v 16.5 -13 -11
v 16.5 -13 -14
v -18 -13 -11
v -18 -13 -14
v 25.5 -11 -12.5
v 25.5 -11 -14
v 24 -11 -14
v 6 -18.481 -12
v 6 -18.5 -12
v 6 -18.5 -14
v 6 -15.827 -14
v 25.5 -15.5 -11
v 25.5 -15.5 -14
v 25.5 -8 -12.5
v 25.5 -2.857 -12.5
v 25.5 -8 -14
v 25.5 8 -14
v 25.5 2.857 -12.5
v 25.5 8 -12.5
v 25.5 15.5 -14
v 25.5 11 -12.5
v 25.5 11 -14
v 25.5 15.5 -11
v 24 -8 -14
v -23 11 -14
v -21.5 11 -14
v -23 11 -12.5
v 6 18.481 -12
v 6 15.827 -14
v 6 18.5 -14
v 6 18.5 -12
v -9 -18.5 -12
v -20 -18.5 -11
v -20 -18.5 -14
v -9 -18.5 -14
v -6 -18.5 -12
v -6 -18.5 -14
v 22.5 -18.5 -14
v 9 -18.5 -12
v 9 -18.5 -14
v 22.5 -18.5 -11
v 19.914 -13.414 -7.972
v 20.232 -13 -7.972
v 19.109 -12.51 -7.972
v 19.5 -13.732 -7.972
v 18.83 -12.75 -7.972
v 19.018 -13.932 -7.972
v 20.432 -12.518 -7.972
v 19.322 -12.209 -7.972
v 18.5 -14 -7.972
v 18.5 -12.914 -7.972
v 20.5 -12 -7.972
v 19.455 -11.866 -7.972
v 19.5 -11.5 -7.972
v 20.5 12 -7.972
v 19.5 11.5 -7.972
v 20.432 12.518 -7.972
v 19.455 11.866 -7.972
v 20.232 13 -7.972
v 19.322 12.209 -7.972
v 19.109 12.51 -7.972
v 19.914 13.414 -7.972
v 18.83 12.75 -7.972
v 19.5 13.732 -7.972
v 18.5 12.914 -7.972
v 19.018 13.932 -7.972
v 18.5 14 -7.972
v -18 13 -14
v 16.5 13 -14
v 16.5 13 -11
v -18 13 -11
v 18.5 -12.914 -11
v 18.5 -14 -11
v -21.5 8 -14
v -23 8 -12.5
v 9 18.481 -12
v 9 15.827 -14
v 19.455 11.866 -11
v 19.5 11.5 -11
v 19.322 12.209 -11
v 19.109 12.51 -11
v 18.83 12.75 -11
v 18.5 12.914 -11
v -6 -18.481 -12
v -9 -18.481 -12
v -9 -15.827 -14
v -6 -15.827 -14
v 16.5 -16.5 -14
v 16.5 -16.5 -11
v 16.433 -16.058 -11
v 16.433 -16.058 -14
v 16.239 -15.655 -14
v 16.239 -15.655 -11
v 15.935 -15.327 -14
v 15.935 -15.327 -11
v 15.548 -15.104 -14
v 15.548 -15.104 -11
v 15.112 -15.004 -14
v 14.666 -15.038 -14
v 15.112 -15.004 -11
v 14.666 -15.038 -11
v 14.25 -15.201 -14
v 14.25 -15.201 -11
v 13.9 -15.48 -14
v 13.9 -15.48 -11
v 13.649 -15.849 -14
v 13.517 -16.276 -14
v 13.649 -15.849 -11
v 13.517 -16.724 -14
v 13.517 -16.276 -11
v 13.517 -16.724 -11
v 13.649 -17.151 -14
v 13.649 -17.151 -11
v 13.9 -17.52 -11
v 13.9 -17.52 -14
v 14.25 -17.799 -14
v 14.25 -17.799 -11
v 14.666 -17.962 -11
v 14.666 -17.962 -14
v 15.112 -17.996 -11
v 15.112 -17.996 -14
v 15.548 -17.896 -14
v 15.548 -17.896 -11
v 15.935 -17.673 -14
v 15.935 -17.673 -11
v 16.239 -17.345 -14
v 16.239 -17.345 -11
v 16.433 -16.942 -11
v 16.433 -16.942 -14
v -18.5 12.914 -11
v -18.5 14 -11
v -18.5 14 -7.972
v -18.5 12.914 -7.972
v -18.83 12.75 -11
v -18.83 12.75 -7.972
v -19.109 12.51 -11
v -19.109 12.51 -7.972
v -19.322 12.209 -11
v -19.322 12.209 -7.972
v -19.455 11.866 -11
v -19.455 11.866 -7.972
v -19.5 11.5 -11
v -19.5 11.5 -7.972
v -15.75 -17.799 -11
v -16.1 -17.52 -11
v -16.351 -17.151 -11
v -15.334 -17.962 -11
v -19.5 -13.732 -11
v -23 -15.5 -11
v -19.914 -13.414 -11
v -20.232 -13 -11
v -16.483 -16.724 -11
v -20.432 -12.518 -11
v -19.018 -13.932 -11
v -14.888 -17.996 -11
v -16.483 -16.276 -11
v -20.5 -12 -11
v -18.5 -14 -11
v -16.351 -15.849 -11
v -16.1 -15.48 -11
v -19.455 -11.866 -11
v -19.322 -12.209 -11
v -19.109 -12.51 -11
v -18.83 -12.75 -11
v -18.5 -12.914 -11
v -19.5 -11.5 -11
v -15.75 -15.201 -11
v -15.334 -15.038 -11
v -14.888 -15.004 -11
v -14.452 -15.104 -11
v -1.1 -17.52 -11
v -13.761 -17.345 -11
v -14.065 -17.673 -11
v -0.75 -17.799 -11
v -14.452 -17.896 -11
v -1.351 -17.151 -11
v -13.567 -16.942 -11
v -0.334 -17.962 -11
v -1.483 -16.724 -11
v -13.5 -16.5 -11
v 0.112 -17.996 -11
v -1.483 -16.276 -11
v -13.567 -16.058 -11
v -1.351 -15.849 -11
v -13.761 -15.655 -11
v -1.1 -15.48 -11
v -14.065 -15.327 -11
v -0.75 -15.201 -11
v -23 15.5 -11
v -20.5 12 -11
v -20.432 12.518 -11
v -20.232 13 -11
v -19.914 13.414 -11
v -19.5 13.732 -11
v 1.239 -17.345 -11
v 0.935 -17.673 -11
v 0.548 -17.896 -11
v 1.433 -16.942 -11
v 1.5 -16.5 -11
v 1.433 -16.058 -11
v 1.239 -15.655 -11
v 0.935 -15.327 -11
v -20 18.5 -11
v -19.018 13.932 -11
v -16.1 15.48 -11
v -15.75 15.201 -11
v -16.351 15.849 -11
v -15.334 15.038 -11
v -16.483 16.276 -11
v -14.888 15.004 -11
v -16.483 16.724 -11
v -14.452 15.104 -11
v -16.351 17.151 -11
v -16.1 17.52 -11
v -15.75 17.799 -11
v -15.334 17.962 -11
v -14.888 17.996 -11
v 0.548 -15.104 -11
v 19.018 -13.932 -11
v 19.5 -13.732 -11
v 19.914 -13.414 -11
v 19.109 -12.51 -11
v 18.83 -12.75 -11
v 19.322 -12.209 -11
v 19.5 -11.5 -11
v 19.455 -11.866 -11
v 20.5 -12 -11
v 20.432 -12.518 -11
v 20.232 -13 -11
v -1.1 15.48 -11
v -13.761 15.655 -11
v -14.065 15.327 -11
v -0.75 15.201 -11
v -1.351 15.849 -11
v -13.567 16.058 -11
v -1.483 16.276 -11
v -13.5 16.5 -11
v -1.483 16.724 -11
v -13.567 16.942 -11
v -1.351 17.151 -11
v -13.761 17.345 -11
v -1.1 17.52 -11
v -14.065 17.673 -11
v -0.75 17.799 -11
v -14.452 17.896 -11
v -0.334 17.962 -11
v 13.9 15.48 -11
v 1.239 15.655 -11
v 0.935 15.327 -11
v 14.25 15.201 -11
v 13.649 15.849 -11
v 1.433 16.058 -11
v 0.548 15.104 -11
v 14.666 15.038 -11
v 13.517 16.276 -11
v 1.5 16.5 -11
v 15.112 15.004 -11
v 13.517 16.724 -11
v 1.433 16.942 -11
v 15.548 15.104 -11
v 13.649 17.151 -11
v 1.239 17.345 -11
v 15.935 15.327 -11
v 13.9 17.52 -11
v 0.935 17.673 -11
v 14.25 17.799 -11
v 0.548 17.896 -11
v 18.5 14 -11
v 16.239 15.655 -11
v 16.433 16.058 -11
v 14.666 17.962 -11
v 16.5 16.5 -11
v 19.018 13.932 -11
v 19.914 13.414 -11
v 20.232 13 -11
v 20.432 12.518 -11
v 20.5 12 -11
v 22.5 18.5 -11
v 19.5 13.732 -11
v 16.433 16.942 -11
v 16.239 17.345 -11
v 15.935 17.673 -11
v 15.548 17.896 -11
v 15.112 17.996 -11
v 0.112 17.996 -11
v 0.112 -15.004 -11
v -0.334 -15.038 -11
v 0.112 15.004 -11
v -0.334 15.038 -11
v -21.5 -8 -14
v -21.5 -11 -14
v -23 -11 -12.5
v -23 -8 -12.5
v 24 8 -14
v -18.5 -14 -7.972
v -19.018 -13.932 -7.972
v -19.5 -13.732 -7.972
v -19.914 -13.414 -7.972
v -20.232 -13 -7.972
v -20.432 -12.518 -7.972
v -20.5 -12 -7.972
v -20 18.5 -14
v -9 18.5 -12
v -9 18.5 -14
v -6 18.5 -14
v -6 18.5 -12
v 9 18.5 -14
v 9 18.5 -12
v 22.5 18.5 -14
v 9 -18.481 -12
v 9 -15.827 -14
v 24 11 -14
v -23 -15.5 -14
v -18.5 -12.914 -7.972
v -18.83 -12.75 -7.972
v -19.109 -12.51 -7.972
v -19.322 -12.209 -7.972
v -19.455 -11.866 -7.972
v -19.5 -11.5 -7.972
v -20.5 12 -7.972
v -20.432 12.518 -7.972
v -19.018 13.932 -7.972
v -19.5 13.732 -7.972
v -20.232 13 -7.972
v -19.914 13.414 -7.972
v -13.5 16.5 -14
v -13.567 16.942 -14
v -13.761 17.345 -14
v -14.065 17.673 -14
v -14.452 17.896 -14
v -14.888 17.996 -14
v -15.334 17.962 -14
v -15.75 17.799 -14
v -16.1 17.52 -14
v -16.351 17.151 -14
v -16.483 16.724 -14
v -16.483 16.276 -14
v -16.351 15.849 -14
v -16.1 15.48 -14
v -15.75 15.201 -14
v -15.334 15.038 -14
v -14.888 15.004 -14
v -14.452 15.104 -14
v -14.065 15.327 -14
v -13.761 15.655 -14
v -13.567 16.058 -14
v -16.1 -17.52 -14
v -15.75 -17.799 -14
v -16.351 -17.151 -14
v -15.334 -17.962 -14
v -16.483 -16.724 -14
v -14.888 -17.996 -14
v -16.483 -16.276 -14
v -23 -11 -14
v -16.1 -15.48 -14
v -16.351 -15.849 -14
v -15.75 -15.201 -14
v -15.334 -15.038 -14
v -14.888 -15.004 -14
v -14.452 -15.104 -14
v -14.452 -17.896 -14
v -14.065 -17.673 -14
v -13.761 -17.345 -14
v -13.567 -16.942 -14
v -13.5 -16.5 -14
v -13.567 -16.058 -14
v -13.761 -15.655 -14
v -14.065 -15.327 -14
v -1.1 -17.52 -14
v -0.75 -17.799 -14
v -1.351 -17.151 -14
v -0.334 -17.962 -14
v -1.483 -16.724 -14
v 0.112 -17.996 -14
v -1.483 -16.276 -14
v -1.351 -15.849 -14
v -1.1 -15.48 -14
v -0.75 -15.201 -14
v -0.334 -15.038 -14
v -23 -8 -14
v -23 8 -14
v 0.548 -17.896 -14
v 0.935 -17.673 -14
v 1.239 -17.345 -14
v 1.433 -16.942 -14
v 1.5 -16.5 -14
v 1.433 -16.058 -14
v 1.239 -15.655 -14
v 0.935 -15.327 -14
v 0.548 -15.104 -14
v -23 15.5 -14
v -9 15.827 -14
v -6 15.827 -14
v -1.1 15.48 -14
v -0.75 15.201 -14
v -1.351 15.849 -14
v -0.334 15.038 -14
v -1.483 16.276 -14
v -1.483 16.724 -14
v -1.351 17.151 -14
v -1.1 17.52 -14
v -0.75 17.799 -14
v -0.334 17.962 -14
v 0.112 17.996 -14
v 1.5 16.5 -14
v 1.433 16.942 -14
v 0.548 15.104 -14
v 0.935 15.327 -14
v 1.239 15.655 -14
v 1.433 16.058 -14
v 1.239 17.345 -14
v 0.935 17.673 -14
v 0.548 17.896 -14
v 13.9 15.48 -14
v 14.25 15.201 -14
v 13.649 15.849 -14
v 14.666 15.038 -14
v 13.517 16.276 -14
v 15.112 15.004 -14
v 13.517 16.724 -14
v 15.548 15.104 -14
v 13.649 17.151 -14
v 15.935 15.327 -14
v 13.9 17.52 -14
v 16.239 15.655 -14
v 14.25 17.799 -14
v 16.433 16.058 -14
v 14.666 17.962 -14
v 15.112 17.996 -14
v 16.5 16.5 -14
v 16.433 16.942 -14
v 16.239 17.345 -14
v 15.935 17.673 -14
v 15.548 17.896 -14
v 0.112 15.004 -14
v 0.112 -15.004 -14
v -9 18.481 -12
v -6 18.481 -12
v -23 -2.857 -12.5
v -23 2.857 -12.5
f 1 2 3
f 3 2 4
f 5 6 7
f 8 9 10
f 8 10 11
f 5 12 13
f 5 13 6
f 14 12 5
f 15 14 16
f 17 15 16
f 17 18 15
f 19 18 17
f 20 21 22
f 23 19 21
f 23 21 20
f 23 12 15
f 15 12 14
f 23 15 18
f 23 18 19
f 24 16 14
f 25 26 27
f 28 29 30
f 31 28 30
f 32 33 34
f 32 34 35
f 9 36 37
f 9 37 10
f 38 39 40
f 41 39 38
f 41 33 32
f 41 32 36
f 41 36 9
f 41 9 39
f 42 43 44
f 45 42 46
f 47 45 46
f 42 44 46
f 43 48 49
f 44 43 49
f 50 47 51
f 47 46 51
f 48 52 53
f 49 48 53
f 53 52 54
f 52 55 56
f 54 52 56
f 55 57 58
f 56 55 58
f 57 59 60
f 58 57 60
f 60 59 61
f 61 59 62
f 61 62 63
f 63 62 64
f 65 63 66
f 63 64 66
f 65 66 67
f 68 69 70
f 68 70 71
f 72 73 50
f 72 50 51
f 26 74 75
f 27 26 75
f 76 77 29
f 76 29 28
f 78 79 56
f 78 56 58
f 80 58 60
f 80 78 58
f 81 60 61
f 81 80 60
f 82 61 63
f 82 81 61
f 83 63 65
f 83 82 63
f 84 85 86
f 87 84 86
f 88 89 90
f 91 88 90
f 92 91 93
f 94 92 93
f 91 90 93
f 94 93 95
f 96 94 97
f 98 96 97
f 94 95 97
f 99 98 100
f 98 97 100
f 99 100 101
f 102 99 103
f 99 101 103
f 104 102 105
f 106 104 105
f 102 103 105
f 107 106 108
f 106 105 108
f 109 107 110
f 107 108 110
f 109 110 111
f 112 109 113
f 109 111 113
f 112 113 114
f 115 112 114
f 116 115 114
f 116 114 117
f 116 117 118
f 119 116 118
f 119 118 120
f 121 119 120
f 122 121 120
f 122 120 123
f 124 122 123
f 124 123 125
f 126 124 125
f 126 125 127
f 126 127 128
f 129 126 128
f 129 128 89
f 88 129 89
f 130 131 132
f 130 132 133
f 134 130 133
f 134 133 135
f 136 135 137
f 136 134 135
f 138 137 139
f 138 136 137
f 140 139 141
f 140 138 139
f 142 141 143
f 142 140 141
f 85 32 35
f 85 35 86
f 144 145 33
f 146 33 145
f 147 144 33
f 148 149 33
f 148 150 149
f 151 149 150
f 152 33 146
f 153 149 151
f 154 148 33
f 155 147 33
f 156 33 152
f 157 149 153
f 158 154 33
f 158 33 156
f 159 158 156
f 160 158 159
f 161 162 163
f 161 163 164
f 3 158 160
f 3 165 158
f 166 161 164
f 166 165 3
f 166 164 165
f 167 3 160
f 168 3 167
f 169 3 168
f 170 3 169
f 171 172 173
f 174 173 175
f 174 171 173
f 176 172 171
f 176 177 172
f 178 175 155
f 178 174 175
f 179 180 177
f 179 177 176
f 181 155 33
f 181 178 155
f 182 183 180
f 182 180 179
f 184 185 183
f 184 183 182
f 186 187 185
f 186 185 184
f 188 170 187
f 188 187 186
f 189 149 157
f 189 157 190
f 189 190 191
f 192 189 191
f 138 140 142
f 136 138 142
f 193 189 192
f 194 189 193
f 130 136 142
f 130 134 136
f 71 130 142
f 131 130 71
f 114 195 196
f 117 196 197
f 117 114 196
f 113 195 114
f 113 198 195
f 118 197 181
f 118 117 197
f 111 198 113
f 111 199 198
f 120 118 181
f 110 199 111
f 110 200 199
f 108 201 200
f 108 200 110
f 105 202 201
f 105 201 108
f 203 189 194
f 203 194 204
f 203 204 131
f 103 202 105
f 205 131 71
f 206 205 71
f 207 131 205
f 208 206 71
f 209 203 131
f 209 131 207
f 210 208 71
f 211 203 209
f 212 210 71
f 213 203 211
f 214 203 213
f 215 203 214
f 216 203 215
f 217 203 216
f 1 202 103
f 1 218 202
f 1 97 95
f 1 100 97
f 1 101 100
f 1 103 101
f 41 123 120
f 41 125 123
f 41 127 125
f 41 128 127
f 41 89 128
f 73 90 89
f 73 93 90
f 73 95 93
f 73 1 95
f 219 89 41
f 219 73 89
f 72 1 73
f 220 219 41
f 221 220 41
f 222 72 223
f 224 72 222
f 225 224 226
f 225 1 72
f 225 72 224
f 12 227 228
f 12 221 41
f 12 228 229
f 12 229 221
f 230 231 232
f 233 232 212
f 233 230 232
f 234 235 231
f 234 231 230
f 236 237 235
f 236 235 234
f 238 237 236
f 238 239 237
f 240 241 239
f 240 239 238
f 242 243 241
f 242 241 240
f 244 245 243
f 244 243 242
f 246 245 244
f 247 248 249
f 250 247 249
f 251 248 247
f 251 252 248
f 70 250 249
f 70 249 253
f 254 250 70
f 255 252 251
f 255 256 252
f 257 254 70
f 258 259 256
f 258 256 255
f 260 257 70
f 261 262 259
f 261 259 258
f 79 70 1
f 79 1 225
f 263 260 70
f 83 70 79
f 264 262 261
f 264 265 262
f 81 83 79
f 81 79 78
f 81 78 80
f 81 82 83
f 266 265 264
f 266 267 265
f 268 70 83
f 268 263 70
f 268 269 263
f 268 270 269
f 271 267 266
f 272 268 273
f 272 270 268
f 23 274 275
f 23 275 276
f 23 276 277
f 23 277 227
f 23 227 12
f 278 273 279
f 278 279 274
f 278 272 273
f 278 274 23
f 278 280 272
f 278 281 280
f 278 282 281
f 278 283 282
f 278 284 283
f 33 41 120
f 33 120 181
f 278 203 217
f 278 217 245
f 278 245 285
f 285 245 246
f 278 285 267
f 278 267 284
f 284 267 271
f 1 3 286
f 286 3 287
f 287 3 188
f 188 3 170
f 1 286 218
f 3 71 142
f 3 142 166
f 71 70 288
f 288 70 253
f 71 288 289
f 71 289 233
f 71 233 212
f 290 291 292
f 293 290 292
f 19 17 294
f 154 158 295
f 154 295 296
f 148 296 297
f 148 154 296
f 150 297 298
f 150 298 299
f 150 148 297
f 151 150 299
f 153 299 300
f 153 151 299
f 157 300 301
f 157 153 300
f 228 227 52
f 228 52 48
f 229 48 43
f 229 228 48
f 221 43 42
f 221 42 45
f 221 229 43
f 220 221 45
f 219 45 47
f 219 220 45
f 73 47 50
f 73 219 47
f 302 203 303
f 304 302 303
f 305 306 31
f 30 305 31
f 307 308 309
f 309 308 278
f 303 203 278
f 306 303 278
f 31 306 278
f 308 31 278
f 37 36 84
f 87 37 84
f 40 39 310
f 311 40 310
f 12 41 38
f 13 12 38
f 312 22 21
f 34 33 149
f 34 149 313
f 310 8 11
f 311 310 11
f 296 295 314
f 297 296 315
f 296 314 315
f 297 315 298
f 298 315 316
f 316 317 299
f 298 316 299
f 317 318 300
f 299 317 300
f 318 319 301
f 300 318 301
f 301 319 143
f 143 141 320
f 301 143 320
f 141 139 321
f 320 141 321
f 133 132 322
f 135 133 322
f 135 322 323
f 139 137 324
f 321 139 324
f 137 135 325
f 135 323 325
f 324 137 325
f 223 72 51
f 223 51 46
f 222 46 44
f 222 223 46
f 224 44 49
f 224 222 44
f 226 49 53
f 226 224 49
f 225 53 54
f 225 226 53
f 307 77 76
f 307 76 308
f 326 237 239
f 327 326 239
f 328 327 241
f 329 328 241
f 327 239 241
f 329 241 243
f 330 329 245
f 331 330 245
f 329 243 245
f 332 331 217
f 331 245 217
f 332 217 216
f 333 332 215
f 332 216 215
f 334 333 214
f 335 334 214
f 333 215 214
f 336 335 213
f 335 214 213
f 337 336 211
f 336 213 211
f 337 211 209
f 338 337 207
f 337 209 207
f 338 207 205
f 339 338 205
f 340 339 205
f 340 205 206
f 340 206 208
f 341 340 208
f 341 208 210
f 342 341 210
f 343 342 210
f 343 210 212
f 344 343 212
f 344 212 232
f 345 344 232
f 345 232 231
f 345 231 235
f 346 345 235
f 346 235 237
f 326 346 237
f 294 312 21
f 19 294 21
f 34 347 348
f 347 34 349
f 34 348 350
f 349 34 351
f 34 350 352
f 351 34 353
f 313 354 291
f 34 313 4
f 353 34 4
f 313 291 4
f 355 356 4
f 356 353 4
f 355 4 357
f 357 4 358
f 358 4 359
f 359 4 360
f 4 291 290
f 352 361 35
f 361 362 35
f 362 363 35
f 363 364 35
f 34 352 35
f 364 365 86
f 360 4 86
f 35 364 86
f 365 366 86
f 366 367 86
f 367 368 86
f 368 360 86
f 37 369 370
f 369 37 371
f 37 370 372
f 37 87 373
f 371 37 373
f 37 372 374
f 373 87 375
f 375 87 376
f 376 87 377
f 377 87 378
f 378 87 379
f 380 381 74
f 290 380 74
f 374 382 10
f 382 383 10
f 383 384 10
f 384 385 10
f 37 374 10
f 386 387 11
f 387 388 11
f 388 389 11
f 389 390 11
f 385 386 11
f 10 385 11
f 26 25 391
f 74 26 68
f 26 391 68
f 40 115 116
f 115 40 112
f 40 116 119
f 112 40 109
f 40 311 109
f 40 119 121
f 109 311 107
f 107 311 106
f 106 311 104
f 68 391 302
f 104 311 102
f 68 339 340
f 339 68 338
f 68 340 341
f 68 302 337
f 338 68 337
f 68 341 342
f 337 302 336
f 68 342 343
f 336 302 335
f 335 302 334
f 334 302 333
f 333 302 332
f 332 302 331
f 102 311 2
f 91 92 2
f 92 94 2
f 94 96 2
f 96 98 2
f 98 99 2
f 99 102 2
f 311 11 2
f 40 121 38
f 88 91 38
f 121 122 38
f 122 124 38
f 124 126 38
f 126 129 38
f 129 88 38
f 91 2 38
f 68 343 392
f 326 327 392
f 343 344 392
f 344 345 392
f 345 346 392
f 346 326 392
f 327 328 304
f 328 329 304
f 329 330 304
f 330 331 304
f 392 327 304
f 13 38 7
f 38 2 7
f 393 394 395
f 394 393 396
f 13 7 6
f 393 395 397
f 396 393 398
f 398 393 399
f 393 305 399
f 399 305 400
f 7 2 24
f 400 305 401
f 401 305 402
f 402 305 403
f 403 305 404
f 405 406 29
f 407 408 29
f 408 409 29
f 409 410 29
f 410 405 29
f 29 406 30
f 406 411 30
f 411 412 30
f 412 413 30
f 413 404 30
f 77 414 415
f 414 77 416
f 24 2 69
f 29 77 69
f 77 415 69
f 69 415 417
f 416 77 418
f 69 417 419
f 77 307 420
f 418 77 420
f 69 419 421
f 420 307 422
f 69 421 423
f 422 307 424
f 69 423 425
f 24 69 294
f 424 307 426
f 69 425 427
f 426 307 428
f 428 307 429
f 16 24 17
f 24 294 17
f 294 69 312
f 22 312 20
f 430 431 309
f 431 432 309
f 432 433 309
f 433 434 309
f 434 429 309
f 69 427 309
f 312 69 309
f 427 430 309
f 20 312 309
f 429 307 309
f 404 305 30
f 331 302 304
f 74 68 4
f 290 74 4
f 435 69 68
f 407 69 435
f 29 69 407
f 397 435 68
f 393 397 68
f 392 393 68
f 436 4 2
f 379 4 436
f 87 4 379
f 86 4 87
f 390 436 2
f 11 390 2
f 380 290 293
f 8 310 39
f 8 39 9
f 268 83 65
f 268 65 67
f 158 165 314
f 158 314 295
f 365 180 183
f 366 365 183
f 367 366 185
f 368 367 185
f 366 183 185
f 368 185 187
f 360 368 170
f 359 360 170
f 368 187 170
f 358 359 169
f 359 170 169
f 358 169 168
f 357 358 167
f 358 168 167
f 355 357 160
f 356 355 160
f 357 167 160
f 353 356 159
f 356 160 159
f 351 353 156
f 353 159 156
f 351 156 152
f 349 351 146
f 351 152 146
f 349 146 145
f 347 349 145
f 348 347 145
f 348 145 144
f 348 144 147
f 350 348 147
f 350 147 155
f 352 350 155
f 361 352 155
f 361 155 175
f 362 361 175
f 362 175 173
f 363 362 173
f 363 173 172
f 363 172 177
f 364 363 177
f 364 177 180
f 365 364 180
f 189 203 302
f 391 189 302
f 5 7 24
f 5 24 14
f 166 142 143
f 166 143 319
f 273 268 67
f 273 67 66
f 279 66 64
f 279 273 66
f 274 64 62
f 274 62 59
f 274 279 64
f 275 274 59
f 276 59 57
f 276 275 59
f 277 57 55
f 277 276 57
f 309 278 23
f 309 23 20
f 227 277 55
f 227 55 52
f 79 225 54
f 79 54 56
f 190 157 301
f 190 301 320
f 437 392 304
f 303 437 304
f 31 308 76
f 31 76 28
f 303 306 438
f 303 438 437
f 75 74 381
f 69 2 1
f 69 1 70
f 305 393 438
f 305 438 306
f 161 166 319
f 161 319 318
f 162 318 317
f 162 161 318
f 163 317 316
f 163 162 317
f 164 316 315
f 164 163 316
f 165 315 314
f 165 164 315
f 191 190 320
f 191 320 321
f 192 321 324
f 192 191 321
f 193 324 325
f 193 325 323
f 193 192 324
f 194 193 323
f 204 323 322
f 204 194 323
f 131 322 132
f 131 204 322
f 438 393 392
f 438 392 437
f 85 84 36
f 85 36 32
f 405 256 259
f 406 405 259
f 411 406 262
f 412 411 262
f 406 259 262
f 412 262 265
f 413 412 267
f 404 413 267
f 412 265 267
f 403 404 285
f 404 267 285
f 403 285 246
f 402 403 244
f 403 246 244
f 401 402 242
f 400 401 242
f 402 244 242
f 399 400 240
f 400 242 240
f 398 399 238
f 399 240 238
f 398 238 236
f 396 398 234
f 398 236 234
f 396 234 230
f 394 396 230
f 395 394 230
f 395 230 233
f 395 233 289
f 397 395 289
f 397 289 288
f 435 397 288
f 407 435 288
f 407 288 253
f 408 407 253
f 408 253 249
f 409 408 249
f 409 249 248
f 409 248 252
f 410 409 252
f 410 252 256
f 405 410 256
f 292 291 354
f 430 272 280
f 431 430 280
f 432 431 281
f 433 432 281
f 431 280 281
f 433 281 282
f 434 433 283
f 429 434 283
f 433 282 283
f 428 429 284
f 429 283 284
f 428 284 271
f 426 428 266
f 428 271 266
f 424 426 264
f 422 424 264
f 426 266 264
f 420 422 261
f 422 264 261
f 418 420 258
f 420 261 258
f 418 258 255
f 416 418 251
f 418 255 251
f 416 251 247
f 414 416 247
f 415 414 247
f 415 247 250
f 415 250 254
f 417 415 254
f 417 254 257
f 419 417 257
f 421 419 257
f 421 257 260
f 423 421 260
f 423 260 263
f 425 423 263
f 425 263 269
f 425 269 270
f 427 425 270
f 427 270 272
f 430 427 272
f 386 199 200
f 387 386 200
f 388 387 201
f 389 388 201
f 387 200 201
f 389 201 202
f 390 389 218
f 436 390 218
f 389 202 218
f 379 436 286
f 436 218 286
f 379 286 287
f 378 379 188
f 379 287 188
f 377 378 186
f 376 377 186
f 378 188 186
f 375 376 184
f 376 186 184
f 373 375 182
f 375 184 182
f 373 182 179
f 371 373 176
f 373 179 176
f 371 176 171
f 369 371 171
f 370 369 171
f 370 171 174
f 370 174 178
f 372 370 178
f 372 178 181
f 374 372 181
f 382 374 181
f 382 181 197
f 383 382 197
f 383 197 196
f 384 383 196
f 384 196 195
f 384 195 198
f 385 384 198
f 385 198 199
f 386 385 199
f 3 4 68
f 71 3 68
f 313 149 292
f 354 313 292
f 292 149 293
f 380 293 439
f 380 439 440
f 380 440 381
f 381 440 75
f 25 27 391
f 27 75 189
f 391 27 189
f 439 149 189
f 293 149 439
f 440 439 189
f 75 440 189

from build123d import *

# Parameters (mm, degrees)
SKETCH_1_W                = 48.5
SKETCH_1_H                = 37
EXTRUDE_1_DEPTH           = 3
SKETCH_2_W                = 21.920667416
SKETCH_2_H                = 2.787
CUT_EXTRUDE_1_DEPTH       = 32.646484797
SKETCH_6_W                = 21.920667416
SKETCH_6_H                = 2.787
CUT_EXTRUDE_5_DEPTH       = 32.646484797
EXTRUDE_2_DEPTH           = 3.028
EXTRUDE_3_DEPTH           = 3.028
HOLE_WIZARD_M4_1_D        = 4.447
HOLE_WIZARD_3_0_3_1_D     = 3
HOLE_WIZARD_3_0_3_1_DEPTH = 6.028
SKETCH_13_W               = 34.5
SKETCH_13_H               = 26.000497192
CUT_EXTRUDE_7_DEPTH       = 10
CHAMFER_1_SIZE            = 3
SKETCH_14_W               = 3
SKETCH_14_H               = 4
CUT_EXTRUDE_8_DEPTH       = 2
CHAMFER_2_SIZE            = 3
CHAMFER_2_SIZE_2          = 3.981134465
SKETCH_15_W               = 2
SKETCH_15_H               = 3
CUT_EXTRUDE_9_DEPTH       = 1.5
CHAMFER_3_SIZE            = 2


with BuildPart() as part:
    # 草图1 → 凸台-拉伸1 (new body)
    with BuildSketch(Plane.XY.offset(-11)):
        with Locations((1.25, 0)):
            Rectangle(SKETCH_1_W, SKETCH_1_H)
    extrude(amount=-EXTRUDE_1_DEPTH)

    # 草图2 → 切除-拉伸1 (cut, through all)
    with BuildSketch(Plane(origin=(0, 0, -14), x_dir=(-1, 0, 0), z_dir=(0, 0, -1))):
        with Locations((6.539666292, -11.606748596)):
            Rectangle(SKETCH_2_W, SKETCH_2_H)
    extrude(amount=-CUT_EXTRUDE_1_DEPTH, mode=Mode.SUBTRACT)

    # 草图6 → 切除-拉伸5 (cut, through all)
    with BuildSketch(Plane(origin=(0, 0, -14), x_dir=(-1, 0, 0), z_dir=(0, 0, -1))):
        with Locations((6.539666292, 11.606748596)):
            Rectangle(SKETCH_6_W, SKETCH_6_H)
    extrude(amount=-CUT_EXTRUDE_5_DEPTH, mode=Mode.SUBTRACT)

    # 草图7 → 凸台-拉伸2 (add)
    with BuildSketch(Plane.XY.offset(-11)):
        with BuildLine():
            Line((-20.5, -12), (-20.5, 12))
            ThreePointArc((-20.5, 12), (-19.914213562, 13.414213562), (-18.5, 14))
            Line((-18.5, 14), (-18.5, 12.914213562))
            ThreePointArc((-18.5, 12.914213562), (-19.224744871, 12.366025404), (-19.5, 11.5))
            Line((-19.5, 11.5), (-19.5, -11.5))
            ThreePointArc((-19.5, -11.5), (-19.224744871, -12.366025404), (-18.5, -12.914213562))
            Line((-18.5, -12.914213562), (-18.5, -14))
            ThreePointArc((-18.5, -14), (-19.914213562, -13.414213562), (-20.5, -12))
        make_face()
    extrude(amount=EXTRUDE_2_DEPTH)

    # 草图8 → 凸台-拉伸3 (add)
    with BuildSketch(Plane.XY.offset(-11)):
        with BuildLine():
            Line((19.5, -11.5), (19.5, 11.5))
            ThreePointArc((19.5, 11.5), (19.224744871, 12.366025404), (18.5, 12.914213562))
            Line((18.5, 12.914213562), (18.5, 14))
            ThreePointArc((18.5, 14), (19.914213562, 13.414213562), (20.5, 12))
            Line((20.5, 12), (20.5, -12))
            ThreePointArc((20.5, -12), (19.914213562, -13.414213562), (18.5, -14))
            Line((18.5, -14), (18.5, -12.914213562))
            ThreePointArc((18.5, -12.914213562), (19.224744871, -12.366025404), (19.5, -11.5))
        make_face()
    extrude(amount=EXTRUDE_3_DEPTH)

    # M4 间隙孔1 (through all)
    with Locations(Plane.XY.offset(-11)):
        with Locations((12.25, 6.000000304)):
            Hole(HOLE_WIZARD_M4_1_D / 2)

    # Ø3.0 (3) 直径孔1
    with Locations(Plane(origin=(0, 0, -14), x_dir=(-1, 0, 0), z_dir=(0, 0, -1))):
        with Locations((-15, -16.5), (15, -16.5), (0, -16.5), (-15, 16.5), (15, 16.5), (0, 16.5)):
            Hole(HOLE_WIZARD_3_0_3_1_D / 2, depth=HOLE_WIZARD_3_0_3_1_DEPTH)

    # 草图13 → 切除-拉伸7 (cut, symmetric)
    with BuildSketch(Plane(origin=(0, 0, -14), x_dir=(-1, 0, 0), z_dir=(0, 0, -1))):
        with Locations((0.75, 0)):
            Rectangle(SKETCH_13_W, SKETCH_13_H)
    extrude(amount=CUT_EXTRUDE_7_DEPTH, both=True, mode=Mode.SUBTRACT)

    # 倒角1
    chamfer_1_edges = [part.edges().sort_by_distance(p)[0] for p in [
        (-23, 18.5, -12.5),
        (25.5, 18.5, -12.5),
        (25.5, -18.5, -12.5),
        (-23, -18.5, -12.5),
    ]]
    chamfer(chamfer_1_edges, length=CHAMFER_1_SIZE)

    # 草图14 → 切除-拉伸8 (cut)
    with BuildSketch(Plane(origin=(0, 0, -14), x_dir=(-1, 0, 0), z_dir=(0, 0, -1))):
        with Locations((-7.5, -16.5)):
            Rectangle(SKETCH_14_W, SKETCH_14_H)
        with Locations((7.5, -16.5)):
            Rectangle(SKETCH_14_W, SKETCH_14_H)
        with Locations((7.5, 16.5)):
            Rectangle(SKETCH_14_W, SKETCH_14_H)
        with Locations((-7.5, 16.5)):
            Rectangle(SKETCH_14_W, SKETCH_14_H)
    extrude(amount=-CUT_EXTRUDE_8_DEPTH, mode=Mode.SUBTRACT)

    # 倒角2
    # the kernel refuses this chamfer: 3.981134465, 3 mm, written as the material it adds along each edge
    with BuildSketch(Plane(origin=(-6, 14.5, -12), x_dir=(0, -0.04104604510109815, -0.9991572559820394), z_dir=(-1, 0, 0))) as chamfer_2_piece_1_section:
        Polygon((CHAMFER_2_SIZE * 0.999157255982, -CHAMFER_2_SIZE * 0.0410460451011), (-CHAMFER_2_SIZE_2 * 0.0410460450997, -CHAMFER_2_SIZE_2 * 0.999157255947), (0, 0), align=None)
    chamfer_2_piece_1 = extrude(amount=3, mode=Mode.PRIVATE)
    chamfer_2_piece_1 = split(chamfer_2_piece_1, bisect_by=Plane(origin=(-7.5, 15.961237376, -14), z_dir=(0, 0, 1)), keep=Keep.TOP, mode=Mode.PRIVATE)
    add(chamfer_2_piece_1)
    with BuildSketch(Plane(origin=(9, 14.5, -12), x_dir=(0, -0.04104604510109815, -0.9991572559820394), z_dir=(-1, 0, 0))) as chamfer_2_piece_2_section:
        Polygon((CHAMFER_2_SIZE * 0.999157255982, -CHAMFER_2_SIZE * 0.0410460451011), (-CHAMFER_2_SIZE_2 * 0.0410460450997, -CHAMFER_2_SIZE_2 * 0.999157255947), (0, 0), align=None)
    chamfer_2_piece_2 = extrude(amount=3, mode=Mode.PRIVATE)
    chamfer_2_piece_2 = split(chamfer_2_piece_2, bisect_by=Plane(origin=(7.5, 15.961237376, -14), z_dir=(0, 0, 1)), keep=Keep.TOP, mode=Mode.PRIVATE)
    add(chamfer_2_piece_2)
    with BuildSketch(Plane(origin=(-9, -14.5, -12), x_dir=(0, -0.9997280272590685, 0.023321052992758363), z_dir=(1, 0, 0))) as chamfer_2_piece_3_section:
        Polygon((CHAMFER_2_SIZE_2 * 0.999728027224, CHAMFER_2_SIZE_2 * 0.0233210529919), (-CHAMFER_2_SIZE * 0.0233210529928, CHAMFER_2_SIZE * 0.999728027259), (0, 0), align=None)
    chamfer_2_piece_3 = extrude(amount=3, mode=Mode.PRIVATE)
    chamfer_2_piece_3 = split(chamfer_2_piece_3, bisect_by=Plane(origin=(-7.5, -15.961237376, -14), z_dir=(0, 0, 1)), keep=Keep.TOP, mode=Mode.PRIVATE)
    add(chamfer_2_piece_3)
    with BuildSketch(Plane(origin=(6, -14.5, -12), x_dir=(0, -0.9997280272590685, 0.023321052992758374), z_dir=(1, 0, 0))) as chamfer_2_piece_4_section:
        Polygon((CHAMFER_2_SIZE_2 * 0.999728027224, CHAMFER_2_SIZE_2 * 0.0233210529919), (-CHAMFER_2_SIZE * 0.0233210529928, CHAMFER_2_SIZE * 0.999728027259), (0, 0), align=None)
    chamfer_2_piece_4 = extrude(amount=3, mode=Mode.PRIVATE)
    chamfer_2_piece_4 = split(chamfer_2_piece_4, bisect_by=Plane(origin=(7.5, -15.961237376, -14), z_dir=(0, 0, 1)), keep=Keep.TOP, mode=Mode.PRIVATE)
    add(chamfer_2_piece_4)

    # 草图15 → 切除-拉伸9 (cut)
    with BuildSketch(Plane(origin=(0, 0, -14), x_dir=(-1, 0, 0), z_dir=(0, 0, -1))):
        with Locations((-24.5, -9.5)):
            Rectangle(SKETCH_15_W, SKETCH_15_H)
        with Locations((-24.5, 9.5)):
            Rectangle(SKETCH_15_W, SKETCH_15_H)
        with Locations((22, 9.5)):
            Rectangle(SKETCH_15_W, SKETCH_15_H)
        with Locations((22, -9.5)):
            Rectangle(SKETCH_15_W, SKETCH_15_H)
    extrude(amount=-CUT_EXTRUDE_9_DEPTH, mode=Mode.SUBTRACT)

    # 倒角3
    # the kernel refuses this chamfer: 2 mm, written as the material it adds along each edge
    with BuildSketch(Plane(origin=(-21, 2.856634024, -12.5), x_dir=(0.027495876610585623, 0, -0.9996219169112968), z_dir=(0, 1, 0))) as chamfer_3_piece_1_section:
        Polygon((CHAMFER_3_SIZE * 0.999621916911, CHAMFER_3_SIZE * 0.0274958766106), (-CHAMFER_3_SIZE * 0.0274958766106, CHAMFER_3_SIZE * 0.999621916911), (0, 0), align=None)
    chamfer_3_piece_1 = extrude(amount=13.286731952, mode=Mode.PRIVATE)
    chamfer_3_piece_1 = split(chamfer_3_piece_1, bisect_by=Plane(origin=(-21.7, 9.5, -14), z_dir=(0, 0, 1)), keep=Keep.TOP, mode=Mode.PRIVATE)
    chamfer_3_piece_1 = split(chamfer_3_piece_1, bisect_by=Plane(origin=(-25.35, 13.15, -13.1), z_dir=(0.7071067811865476, -0.7071067811865476, 0)), keep=Keep.TOP, mode=Mode.PRIVATE)
    add(chamfer_3_piece_1)
    with BuildSketch(Plane(origin=(-21, -2.856634024, -12.5), x_dir=(0.027495876610585623, 0, -0.9996219169112968), z_dir=(0, -1, 0))) as chamfer_3_piece_2_section:
        Polygon((CHAMFER_3_SIZE * 0.999621916911, -CHAMFER_3_SIZE * 0.0274958766106), (-CHAMFER_3_SIZE * 0.0274958766106, -CHAMFER_3_SIZE * 0.999621916911), (0, 0), align=None)
    chamfer_3_piece_2 = extrude(amount=8.143365976, mode=Mode.PRIVATE)
    chamfer_3_piece_2 = split(chamfer_3_piece_2, bisect_by=Plane(origin=(-21.7, -9.5, -14), z_dir=(0, 0, 1)), keep=Keep.TOP, mode=Mode.PRIVATE)
    add(chamfer_3_piece_2)
    with BuildSketch(Plane(origin=(23.5, 2.856634024, -12.5), x_dir=(-0.027495876610585623, 0, -0.9996219169112968), z_dir=(0, 1, 0))) as chamfer_3_piece_3_section:
        Polygon((CHAMFER_3_SIZE * 0.999621916911, -CHAMFER_3_SIZE * 0.0274958766106), (-CHAMFER_3_SIZE * 0.0274958766106, -CHAMFER_3_SIZE * 0.999621916911), (0, 0), align=None)
    chamfer_3_piece_3 = extrude(amount=8.143365976, mode=Mode.PRIVATE)
    chamfer_3_piece_3 = split(chamfer_3_piece_3, bisect_by=Plane(origin=(24.2, 9.5, -14), z_dir=(0, 0, 1)), keep=Keep.TOP, mode=Mode.PRIVATE)
    add(chamfer_3_piece_3)
    with BuildSketch(Plane(origin=(23.5, -2.856634024, -12.5), x_dir=(-0.027495876610585623, 0, -0.9996219169112968), z_dir=(0, -1, 0))) as chamfer_3_piece_4_section:
        Polygon((CHAMFER_3_SIZE * 0.999621916911, CHAMFER_3_SIZE * 0.0274958766106), (-CHAMFER_3_SIZE * 0.0274958766106, CHAMFER_3_SIZE * 0.999621916911), (0, 0), align=None)
    chamfer_3_piece_4 = extrude(amount=13.286731952, mode=Mode.PRIVATE)
    chamfer_3_piece_4 = split(chamfer_3_piece_4, bisect_by=Plane(origin=(24.2, -9.5, -14), z_dir=(0, 0, 1)), keep=Keep.TOP, mode=Mode.PRIVATE)
    chamfer_3_piece_4 = split(chamfer_3_piece_4, bisect_by=Plane(origin=(27.85, -13.15, -13.1), z_dir=(-0.7071067811865476, 0.7071067811865476, 0)), keep=Keep.TOP, mode=Mode.PRIVATE)
    add(chamfer_3_piece_4)


solid = part.part
